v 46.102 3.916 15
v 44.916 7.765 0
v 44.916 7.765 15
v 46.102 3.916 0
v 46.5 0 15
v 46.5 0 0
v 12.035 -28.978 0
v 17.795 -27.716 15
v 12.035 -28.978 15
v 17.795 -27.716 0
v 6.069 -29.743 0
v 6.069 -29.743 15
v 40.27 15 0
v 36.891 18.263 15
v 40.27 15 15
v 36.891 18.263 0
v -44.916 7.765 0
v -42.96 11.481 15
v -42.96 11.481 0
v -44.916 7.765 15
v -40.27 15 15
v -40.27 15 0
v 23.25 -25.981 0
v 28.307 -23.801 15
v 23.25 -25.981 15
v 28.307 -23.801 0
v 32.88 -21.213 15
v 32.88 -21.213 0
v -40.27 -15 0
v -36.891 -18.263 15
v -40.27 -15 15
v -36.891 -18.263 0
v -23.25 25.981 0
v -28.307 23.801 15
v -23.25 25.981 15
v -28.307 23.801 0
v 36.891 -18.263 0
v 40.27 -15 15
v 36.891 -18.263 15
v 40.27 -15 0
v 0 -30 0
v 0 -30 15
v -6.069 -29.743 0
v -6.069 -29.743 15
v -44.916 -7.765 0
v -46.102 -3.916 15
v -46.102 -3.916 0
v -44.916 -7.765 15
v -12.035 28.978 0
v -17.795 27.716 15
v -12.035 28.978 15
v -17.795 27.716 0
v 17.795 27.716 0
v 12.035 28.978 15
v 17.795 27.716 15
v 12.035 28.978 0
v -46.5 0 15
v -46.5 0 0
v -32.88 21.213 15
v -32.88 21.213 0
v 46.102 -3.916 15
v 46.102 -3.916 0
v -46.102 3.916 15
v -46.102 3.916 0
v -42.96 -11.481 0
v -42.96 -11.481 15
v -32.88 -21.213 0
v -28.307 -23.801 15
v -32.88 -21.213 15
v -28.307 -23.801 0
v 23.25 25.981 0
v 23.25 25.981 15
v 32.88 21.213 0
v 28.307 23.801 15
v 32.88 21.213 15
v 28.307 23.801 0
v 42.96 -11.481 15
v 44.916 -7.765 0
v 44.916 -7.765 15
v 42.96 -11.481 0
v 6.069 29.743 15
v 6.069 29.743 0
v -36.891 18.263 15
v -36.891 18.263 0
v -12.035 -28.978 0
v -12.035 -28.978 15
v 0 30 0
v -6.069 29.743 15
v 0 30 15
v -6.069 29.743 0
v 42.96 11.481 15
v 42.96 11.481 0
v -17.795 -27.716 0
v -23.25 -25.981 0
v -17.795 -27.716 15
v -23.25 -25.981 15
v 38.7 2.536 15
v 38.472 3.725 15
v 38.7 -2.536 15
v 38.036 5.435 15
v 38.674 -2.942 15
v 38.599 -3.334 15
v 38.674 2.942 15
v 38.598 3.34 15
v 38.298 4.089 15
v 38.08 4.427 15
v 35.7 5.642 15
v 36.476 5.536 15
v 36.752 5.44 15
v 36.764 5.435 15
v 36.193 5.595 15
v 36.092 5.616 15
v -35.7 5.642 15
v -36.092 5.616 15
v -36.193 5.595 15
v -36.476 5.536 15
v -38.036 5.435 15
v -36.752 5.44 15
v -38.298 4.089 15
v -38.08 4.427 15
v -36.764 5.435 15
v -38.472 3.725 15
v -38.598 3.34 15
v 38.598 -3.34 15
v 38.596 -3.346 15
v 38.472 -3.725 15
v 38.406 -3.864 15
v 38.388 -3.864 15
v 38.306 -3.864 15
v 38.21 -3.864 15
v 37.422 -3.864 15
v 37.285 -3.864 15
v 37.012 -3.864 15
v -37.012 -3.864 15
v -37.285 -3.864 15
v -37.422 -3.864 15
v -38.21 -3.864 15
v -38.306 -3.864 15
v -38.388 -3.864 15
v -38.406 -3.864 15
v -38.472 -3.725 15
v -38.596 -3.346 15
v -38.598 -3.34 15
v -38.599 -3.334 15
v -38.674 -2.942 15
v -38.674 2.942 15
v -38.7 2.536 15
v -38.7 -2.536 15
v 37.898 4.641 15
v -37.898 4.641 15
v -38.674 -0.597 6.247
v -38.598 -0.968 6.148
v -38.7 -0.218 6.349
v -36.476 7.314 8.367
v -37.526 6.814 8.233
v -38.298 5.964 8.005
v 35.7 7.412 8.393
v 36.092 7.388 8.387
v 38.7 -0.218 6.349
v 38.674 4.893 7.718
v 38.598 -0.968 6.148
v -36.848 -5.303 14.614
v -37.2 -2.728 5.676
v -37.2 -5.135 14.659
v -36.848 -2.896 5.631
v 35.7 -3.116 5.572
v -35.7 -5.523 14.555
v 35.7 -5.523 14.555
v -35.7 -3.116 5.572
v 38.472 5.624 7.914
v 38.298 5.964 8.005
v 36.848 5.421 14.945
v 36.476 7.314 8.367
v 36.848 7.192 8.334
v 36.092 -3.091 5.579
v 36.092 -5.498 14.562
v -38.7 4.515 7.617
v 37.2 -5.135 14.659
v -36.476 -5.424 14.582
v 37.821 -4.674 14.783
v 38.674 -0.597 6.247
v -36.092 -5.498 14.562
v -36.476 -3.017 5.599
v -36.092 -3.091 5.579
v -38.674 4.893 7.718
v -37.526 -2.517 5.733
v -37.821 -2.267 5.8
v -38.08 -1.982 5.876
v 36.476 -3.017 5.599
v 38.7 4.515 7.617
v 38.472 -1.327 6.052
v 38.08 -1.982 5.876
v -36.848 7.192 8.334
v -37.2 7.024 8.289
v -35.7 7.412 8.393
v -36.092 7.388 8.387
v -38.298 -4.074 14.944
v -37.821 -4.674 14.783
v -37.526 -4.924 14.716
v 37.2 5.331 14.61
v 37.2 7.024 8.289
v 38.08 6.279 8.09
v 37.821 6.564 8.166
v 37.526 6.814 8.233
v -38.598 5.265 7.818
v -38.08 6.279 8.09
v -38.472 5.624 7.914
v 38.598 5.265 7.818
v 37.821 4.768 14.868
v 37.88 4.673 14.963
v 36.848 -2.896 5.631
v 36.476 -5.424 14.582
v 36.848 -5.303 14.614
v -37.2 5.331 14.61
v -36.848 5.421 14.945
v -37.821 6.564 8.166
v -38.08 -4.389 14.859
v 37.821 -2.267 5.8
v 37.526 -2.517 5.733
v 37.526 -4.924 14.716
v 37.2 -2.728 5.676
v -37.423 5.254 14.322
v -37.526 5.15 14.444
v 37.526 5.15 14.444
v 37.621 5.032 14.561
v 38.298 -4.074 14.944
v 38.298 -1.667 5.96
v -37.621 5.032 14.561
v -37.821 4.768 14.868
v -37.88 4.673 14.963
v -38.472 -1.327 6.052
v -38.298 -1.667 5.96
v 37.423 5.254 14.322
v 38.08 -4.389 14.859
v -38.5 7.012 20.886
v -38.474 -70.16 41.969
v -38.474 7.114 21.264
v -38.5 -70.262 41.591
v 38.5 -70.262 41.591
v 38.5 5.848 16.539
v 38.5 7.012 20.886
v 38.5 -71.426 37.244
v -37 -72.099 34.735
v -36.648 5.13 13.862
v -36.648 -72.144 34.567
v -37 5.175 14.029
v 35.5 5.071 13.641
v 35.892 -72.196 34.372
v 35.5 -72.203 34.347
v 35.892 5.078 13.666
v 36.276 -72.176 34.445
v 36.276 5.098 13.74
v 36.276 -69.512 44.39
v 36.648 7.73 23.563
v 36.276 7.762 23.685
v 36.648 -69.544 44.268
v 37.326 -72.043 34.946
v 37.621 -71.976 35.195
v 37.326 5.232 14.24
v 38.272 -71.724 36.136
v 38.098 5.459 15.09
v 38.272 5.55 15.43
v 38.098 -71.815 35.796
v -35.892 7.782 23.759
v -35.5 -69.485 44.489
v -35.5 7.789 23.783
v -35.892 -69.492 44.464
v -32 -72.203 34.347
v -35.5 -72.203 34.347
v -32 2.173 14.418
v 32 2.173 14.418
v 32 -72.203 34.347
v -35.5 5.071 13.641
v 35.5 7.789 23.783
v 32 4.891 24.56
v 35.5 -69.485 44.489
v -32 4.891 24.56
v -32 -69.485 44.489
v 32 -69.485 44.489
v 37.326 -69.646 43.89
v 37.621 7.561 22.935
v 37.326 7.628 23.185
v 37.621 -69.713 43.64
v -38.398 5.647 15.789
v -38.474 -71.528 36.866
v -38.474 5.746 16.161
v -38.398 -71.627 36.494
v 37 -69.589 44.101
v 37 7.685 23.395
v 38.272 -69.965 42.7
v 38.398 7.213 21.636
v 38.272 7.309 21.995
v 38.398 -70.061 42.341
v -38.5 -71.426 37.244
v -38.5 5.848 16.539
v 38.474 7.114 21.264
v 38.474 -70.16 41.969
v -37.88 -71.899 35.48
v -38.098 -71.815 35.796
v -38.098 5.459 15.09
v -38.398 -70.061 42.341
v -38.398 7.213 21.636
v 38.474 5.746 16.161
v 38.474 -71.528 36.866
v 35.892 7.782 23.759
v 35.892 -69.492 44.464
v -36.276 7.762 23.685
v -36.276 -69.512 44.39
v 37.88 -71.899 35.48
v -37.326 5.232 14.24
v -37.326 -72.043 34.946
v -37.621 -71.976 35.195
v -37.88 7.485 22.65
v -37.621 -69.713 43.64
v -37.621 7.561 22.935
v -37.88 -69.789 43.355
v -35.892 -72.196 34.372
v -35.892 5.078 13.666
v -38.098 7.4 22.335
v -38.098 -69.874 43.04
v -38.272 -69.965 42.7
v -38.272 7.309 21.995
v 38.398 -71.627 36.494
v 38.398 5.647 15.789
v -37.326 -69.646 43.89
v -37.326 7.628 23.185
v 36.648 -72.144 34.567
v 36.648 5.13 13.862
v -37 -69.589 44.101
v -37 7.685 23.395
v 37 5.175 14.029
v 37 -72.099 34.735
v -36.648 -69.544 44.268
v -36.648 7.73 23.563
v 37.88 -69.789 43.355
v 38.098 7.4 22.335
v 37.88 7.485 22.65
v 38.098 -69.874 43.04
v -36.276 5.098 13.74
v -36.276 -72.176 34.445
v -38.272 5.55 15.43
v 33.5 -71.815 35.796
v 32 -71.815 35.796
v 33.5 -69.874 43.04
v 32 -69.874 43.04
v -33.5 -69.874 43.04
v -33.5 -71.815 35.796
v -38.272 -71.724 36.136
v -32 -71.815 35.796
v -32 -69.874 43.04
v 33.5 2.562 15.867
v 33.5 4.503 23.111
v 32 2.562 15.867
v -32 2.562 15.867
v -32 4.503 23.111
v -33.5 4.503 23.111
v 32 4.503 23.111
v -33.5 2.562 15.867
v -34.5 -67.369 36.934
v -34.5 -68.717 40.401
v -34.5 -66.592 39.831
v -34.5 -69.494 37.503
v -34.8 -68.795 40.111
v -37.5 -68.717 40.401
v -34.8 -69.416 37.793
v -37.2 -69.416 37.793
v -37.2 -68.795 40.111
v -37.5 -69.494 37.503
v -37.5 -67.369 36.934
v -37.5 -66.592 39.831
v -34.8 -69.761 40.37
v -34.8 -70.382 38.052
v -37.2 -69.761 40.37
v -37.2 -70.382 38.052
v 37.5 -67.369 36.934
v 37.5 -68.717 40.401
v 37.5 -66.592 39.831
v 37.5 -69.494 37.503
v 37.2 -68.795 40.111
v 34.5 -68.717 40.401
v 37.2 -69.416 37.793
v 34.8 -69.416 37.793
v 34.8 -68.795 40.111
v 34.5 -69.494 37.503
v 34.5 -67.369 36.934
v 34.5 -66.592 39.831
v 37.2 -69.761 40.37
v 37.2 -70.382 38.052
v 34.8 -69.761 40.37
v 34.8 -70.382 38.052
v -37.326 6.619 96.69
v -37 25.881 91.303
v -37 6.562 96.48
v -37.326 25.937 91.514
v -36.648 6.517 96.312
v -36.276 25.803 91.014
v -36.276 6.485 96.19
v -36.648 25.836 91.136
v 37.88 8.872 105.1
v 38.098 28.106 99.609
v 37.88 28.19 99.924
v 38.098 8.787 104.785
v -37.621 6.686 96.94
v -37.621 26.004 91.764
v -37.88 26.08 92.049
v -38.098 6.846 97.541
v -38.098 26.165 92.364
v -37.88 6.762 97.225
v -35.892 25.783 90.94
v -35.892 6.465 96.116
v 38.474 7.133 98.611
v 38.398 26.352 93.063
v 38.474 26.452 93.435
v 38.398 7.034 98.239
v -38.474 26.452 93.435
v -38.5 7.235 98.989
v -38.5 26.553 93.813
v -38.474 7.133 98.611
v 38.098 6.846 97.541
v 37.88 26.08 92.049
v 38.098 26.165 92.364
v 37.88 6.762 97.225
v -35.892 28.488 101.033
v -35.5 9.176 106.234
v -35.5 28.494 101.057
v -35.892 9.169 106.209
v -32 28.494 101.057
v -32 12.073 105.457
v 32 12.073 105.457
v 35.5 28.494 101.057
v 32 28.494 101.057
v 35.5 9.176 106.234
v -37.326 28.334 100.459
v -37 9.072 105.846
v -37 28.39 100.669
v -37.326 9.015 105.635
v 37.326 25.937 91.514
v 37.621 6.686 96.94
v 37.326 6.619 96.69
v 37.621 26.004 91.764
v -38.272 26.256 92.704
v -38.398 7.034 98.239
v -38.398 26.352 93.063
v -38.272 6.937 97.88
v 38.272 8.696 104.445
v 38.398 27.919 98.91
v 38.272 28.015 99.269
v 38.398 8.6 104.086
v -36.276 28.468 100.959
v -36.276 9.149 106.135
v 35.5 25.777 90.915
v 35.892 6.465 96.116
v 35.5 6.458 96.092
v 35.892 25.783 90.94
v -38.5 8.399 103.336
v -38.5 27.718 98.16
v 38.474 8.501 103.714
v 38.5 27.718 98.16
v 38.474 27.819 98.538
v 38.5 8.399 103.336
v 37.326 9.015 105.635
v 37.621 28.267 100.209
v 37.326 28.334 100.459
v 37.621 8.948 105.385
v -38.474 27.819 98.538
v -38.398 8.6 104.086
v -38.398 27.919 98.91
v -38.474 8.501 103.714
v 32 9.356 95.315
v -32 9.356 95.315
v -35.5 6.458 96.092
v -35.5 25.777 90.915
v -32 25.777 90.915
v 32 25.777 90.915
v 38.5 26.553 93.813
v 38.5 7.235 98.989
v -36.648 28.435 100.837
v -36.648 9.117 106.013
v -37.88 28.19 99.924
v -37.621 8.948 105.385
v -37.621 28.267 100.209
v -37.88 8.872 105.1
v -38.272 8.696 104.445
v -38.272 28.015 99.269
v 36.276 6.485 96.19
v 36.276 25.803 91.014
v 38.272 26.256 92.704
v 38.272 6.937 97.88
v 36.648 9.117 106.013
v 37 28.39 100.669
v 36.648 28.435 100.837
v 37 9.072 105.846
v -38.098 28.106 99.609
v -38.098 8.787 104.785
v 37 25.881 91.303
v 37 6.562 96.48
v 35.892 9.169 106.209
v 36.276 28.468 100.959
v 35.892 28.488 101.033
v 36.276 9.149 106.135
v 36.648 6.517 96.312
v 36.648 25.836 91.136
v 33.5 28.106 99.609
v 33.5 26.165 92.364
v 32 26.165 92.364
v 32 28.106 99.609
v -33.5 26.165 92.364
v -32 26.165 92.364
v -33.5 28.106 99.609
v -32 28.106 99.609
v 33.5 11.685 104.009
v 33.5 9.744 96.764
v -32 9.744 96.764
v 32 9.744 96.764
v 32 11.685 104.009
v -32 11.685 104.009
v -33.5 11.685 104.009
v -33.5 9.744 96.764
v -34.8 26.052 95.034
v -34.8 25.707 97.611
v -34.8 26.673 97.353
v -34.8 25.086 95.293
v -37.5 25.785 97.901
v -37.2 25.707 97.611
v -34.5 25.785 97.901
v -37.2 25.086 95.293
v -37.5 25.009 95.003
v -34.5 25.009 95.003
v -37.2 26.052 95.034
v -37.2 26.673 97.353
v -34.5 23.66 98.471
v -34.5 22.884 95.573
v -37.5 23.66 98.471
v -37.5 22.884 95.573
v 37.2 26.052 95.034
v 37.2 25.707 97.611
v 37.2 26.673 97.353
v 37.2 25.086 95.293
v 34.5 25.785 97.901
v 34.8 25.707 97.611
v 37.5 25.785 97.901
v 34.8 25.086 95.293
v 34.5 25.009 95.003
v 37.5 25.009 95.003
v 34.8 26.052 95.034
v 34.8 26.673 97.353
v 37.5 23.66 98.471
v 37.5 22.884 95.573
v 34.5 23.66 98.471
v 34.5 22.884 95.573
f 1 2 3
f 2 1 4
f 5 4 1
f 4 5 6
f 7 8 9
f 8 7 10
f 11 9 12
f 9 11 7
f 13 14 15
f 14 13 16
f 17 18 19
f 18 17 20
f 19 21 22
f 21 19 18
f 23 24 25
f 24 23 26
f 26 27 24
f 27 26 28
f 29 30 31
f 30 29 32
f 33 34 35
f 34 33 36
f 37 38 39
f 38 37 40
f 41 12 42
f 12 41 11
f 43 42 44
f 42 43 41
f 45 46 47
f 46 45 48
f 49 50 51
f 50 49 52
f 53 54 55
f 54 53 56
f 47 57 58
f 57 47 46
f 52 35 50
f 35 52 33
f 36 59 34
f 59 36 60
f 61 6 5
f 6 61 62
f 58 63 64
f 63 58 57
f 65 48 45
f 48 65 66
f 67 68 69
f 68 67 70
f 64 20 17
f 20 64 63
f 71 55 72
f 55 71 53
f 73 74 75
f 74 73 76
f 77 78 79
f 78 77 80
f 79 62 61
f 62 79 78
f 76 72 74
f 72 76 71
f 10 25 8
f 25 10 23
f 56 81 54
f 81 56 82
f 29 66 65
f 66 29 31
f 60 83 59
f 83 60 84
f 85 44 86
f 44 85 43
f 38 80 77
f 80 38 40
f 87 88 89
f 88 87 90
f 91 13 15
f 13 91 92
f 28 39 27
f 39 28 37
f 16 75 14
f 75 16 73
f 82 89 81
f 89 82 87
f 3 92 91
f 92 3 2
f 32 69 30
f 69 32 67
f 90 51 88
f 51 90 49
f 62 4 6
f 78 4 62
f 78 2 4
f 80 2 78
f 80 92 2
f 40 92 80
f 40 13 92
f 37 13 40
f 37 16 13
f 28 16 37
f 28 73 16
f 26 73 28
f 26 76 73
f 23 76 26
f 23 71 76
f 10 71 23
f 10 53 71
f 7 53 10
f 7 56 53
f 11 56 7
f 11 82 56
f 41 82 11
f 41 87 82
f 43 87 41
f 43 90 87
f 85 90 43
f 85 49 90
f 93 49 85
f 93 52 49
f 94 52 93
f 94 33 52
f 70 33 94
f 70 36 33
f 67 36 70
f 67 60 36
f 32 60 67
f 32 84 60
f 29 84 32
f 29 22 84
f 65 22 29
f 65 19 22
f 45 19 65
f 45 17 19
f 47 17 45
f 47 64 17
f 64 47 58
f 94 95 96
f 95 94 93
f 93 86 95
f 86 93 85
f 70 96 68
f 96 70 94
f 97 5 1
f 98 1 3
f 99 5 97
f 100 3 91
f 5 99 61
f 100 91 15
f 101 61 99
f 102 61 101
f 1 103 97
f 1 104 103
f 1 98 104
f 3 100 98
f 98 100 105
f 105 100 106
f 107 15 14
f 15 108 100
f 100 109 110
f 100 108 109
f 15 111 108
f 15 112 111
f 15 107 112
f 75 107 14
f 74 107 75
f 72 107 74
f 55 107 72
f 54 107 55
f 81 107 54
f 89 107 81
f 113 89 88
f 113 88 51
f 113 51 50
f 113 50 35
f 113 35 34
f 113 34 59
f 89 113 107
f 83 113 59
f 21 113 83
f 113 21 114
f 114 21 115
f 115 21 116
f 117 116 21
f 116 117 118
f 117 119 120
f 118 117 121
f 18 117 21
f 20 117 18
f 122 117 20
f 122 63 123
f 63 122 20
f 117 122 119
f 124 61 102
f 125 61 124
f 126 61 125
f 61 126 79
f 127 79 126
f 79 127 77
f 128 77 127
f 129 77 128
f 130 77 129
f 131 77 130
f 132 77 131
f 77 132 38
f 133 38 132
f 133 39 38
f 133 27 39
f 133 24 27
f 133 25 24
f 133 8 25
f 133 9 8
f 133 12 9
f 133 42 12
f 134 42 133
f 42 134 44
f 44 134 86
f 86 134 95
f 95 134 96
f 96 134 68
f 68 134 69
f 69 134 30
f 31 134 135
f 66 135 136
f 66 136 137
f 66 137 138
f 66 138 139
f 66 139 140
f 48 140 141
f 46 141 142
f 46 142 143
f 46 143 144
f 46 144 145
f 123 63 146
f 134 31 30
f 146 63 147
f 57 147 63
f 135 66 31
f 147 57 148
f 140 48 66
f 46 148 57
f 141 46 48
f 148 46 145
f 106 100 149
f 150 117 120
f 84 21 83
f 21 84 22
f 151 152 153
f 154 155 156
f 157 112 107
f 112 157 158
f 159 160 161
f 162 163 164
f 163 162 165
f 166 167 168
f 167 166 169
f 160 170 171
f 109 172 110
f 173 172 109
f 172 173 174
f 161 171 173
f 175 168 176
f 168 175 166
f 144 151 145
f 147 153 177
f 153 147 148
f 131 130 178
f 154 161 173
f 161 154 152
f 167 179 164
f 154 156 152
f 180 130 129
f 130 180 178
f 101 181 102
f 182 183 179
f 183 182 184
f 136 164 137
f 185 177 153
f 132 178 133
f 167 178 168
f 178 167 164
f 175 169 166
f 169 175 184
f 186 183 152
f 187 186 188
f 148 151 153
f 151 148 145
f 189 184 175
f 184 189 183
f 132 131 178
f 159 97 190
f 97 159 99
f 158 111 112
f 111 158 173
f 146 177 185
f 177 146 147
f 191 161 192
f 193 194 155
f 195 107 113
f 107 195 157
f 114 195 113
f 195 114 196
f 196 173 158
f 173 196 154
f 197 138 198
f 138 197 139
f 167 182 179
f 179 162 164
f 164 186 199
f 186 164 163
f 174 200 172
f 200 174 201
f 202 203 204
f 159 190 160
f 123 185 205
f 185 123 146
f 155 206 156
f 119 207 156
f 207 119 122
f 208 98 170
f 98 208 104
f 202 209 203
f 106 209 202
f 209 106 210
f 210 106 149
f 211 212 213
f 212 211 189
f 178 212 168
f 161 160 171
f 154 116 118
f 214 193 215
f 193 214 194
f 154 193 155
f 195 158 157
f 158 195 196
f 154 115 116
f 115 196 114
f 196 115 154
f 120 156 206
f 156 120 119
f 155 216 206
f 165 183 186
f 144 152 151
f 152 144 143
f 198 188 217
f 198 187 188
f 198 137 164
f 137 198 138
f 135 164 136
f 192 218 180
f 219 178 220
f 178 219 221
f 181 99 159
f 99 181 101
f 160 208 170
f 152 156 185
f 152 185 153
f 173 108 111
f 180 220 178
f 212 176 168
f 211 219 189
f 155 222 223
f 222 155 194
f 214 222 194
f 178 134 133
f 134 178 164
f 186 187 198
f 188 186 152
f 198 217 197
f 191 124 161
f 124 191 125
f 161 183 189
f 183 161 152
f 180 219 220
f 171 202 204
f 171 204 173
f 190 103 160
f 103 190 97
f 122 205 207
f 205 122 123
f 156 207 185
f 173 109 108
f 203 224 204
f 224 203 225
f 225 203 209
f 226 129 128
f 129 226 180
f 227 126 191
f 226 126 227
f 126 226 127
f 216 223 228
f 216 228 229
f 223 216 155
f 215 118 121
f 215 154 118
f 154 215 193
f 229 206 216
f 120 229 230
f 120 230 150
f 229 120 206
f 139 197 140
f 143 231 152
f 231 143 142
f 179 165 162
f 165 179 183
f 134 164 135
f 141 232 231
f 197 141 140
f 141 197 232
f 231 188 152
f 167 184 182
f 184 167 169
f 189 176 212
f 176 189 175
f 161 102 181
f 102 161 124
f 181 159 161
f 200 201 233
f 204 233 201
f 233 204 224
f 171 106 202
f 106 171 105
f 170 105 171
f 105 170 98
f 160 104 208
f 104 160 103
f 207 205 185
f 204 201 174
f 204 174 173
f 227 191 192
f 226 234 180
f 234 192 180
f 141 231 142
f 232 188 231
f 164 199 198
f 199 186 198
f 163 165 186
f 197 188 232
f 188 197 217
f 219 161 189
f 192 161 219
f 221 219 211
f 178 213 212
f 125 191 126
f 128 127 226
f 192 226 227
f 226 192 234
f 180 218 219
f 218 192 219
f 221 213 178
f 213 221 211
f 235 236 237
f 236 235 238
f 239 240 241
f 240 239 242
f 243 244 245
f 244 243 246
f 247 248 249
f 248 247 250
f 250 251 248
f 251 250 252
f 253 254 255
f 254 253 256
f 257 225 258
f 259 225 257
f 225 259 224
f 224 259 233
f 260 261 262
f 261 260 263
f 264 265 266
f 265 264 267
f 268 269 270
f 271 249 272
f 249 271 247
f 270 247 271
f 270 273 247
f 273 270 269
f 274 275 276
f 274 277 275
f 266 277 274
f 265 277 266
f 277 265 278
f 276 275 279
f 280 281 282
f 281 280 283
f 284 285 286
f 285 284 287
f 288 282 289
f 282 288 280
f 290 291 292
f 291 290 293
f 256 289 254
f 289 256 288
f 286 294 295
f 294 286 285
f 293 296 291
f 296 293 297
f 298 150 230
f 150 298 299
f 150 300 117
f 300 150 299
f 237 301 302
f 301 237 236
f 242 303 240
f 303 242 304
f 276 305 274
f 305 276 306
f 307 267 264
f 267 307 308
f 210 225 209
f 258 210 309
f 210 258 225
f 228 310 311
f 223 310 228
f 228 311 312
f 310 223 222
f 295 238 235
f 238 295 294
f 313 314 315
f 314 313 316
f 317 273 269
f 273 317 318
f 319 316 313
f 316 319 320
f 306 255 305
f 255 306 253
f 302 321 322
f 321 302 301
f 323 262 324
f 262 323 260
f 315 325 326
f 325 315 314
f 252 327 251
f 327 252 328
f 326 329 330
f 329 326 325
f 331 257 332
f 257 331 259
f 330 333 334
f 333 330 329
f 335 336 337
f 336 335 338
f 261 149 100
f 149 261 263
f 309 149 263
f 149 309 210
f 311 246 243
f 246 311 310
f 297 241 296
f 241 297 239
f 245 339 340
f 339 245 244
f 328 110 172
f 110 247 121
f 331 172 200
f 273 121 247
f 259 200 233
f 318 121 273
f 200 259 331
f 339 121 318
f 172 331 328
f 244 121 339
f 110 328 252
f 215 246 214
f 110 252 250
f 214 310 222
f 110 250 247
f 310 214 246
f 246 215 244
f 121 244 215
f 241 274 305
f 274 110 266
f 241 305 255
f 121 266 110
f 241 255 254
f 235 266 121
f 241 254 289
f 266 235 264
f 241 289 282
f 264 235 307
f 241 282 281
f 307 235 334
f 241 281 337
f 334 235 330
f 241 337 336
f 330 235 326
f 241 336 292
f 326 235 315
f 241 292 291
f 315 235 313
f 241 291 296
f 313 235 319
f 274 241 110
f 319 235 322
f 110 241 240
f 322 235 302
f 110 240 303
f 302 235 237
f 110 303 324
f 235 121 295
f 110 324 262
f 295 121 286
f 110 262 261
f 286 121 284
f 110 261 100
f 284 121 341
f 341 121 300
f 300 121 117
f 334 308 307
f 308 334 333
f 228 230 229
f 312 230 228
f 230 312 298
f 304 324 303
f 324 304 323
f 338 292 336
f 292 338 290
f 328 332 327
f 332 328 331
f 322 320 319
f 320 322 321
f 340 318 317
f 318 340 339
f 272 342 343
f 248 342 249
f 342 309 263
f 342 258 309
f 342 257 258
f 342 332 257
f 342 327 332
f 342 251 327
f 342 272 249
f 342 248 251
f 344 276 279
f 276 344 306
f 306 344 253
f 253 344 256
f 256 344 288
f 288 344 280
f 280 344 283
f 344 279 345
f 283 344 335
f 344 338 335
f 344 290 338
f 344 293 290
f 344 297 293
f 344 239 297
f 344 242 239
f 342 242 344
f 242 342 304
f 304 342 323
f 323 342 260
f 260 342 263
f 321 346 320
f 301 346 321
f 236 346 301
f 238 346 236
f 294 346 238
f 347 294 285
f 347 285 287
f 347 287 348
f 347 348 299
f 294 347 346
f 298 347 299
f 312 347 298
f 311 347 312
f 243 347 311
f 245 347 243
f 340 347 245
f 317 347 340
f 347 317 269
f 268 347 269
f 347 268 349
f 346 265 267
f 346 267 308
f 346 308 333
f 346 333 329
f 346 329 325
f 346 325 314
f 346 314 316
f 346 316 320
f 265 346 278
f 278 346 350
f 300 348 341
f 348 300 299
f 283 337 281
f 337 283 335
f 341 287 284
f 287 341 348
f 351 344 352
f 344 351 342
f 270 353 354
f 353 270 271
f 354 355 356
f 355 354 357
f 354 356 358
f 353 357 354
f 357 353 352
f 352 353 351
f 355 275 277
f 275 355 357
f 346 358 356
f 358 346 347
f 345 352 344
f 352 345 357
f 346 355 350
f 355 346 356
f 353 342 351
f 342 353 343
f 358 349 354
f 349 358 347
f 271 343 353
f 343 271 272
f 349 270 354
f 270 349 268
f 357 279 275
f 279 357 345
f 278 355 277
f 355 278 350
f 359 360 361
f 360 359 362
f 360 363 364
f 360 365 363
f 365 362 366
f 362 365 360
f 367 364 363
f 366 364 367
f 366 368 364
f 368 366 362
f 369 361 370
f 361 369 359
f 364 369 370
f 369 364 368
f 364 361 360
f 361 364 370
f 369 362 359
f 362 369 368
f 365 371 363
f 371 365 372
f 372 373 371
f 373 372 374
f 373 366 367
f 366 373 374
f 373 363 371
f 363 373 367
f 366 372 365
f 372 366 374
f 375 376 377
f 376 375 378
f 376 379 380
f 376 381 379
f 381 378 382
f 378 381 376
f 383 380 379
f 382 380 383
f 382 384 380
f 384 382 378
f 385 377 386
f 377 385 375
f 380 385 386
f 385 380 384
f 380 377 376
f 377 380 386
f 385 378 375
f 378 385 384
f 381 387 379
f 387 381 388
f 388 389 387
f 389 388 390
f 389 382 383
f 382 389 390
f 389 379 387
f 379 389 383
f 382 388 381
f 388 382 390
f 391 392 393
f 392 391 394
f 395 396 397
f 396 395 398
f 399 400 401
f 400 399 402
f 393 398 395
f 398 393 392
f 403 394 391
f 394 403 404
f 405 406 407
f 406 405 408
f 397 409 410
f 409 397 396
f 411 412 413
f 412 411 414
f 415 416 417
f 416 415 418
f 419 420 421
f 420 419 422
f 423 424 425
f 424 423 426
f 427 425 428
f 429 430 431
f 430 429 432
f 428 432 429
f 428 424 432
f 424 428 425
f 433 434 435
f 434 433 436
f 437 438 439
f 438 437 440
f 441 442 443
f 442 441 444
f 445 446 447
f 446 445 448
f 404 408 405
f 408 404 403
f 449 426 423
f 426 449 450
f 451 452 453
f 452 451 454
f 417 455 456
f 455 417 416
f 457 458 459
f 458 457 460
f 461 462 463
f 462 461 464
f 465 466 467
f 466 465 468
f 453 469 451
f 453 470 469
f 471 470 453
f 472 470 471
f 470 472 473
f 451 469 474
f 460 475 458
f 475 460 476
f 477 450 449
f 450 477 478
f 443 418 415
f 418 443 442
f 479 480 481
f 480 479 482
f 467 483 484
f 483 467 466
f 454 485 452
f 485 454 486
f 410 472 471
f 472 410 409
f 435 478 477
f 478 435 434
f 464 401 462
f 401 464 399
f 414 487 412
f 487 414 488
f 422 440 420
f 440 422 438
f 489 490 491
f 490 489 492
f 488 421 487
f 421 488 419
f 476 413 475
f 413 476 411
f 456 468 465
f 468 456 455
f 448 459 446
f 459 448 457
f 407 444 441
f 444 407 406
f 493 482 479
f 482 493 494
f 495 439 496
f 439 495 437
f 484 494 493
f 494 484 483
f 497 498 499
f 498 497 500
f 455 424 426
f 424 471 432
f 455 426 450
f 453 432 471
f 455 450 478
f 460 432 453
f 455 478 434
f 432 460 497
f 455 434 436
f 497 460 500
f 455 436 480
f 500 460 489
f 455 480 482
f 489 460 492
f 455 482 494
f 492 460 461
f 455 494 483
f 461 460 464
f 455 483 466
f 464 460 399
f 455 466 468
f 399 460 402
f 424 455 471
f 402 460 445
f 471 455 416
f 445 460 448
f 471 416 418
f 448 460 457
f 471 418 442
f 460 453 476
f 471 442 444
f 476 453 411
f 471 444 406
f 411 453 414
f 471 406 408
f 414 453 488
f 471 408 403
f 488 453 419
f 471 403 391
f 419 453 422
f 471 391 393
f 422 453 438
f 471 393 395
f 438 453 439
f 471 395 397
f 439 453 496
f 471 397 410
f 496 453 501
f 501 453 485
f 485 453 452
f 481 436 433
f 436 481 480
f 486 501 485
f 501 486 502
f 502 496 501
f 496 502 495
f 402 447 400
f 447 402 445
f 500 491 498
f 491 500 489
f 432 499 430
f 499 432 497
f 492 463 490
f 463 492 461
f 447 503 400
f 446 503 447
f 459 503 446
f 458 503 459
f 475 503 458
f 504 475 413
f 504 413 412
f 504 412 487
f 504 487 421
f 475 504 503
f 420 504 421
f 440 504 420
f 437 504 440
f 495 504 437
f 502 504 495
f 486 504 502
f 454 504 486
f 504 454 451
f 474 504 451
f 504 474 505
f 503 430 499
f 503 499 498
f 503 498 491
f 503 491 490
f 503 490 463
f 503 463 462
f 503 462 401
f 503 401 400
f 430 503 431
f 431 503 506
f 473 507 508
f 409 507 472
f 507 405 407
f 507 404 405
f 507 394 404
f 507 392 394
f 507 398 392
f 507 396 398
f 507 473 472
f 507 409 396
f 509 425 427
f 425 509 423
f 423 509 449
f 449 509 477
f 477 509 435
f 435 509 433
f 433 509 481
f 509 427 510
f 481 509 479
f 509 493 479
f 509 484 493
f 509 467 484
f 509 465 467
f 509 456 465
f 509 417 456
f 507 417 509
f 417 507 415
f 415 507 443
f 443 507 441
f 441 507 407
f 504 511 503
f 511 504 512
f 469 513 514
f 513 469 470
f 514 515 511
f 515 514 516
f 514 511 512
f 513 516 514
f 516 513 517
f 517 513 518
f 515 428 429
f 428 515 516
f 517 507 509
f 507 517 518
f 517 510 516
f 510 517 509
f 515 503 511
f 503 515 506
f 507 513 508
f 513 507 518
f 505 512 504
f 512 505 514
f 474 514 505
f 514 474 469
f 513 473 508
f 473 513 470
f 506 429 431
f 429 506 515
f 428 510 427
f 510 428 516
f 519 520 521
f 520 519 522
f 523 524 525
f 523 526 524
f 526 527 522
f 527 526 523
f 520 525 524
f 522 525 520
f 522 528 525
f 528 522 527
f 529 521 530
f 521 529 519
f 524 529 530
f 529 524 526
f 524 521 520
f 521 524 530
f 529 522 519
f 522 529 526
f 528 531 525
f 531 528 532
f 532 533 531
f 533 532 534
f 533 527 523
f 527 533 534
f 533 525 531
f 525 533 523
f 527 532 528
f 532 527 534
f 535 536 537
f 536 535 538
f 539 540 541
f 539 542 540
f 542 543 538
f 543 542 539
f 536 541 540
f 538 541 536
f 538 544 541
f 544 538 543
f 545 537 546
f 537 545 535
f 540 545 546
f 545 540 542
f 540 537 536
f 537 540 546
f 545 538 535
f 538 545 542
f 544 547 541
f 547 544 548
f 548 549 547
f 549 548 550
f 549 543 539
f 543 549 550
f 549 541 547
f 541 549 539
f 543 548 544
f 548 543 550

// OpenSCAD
// PrimeBind PSA Grade Card Bumper V1
// Perimeter frame for PSA graded cards — front and back fully open
// Body + cap snap together with magnets; card faces 100% exposed
//
// --- PSA STANDARD SLAB: 66×93×9.5mm + 1mm clearance per dimension
//
// --- EXPORT -------------------------------------------------------------------
//   1. pb_psa_body.stl   → RENDER = "body"   [black]
//   2. pb_psa_cap.stl    → RENDER = "cap"    [black or color]
//   3. pb_psa_stand.stl  → RENDER = "stand"  [black]
//   RENDER = "both" shows body + cap assembled for preview

$fn = 48;

// ─── PSA SLAB DIMS ─────────────────────────────────────────────
psa_w = 66.0;
psa_h = 93.0;
psa_d = 9.5;

// ─── INTERIOR (slab + 1mm clearance each dimension) ───────────
inner_w = psa_w + 1;    // 67.0mm
inner_d = psa_d + 1;    // 10.5mm
inner_h = psa_h + 1;    // 94.0mm — split between body + cap below

// ─── FRAME WALLS ───────────────────────────────────────────────
side_wall = 5.0;    // left + right walls only — no face walls
floor_t   = 3.0;    // body floor + cap ceiling
r_edge    = 3.0;

// ─── OUTER DIMS ────────────────────────────────────────────────
outer_w = inner_w + 2 * side_wall;   // 77mm
outer_d = inner_d;                    // 10.5mm — both faces open

// ─── HEIGHT SPLIT ──────────────────────────────────────────────
body_h = 80.0;   // body: 77mm interior (80-3)
cap_h  = 20.0;   // cap:  17mm interior (20-3) → total 94mm ✓

// ─── WINDOW LIP ────────────────────────────────────────────────
lip_w = 1.5;   // overhang on each side of window — card can't slide out face
lip_t = 1.5;   // lip depth front-to-back

// ─── MAGNETS (3mm disc, press-fit square pockets) ──────────────
mag_r    = 1.5;   // 3.0mm pocket = 3mm magnet press fit
mag_dep  = 3.2;
mag_seal = 0.8;
snap_r   = 1.2;   // 2.4mm snap lip — retains magnet during pause-at-layer
snap_h   = 1.0;

mag_lx = side_wall / 2;             // left mag X center  = 2.5mm
mag_rx = outer_w - side_wall / 2;   // right mag X center = 74.5mm
mag_cy = outer_d / 2;               // depth center       = 5.25mm

// ─── STAND ─────────────────────────────────────────────────────
lean   = 15;
base_w = outer_w + 16;   // 93mm oval width
base_d = 60.0;
base_h = 15.0;
g_dep  = 8.3;             // groove depth along lean axis (8mm vertical — no window to clear)

RENDER = "all";

// =============================================================================
// HELPER
// =============================================================================

module rbox(w, d, h, r) {
    hull() {
        for (xi = [r, w - r]) for (yi = [r, d - r])
            translate([xi, yi, 0]) cylinder(r=r, h=h);
    }
}

// =============================================================================
// BODY
// Frame: left wall + right wall + bottom floor. Front + back fully open.
// Slab drops in from top. Magnets at top face of each side wall.
// =============================================================================

module bumper_body() {
    difference() {
        rbox(outer_w, outer_d, body_h, r_edge);

        // interior channel — full inner width, between the two face lips
        translate([side_wall, lip_t, floor_t])
            cube([inner_w, outer_d - 2*lip_t, body_h]);
        // front face window — lip_w narrower each side, card can only enter from top
        translate([side_wall + lip_w, -0.01, floor_t])
            cube([inner_w - 2*lip_w, lip_t + 0.01, body_h]);
        // back face window
        translate([side_wall + lip_w, outer_d - lip_t, floor_t])
            cube([inner_w - 2*lip_w, lip_t + 0.01, body_h]);

        // left magnet pocket (snap lip at top — entry point)
        translate([mag_lx - mag_r, mag_cy - mag_r, body_h - mag_dep - mag_seal])
            cube([mag_r*2, mag_r*2, mag_dep - snap_h]);
        translate([mag_lx - snap_r, mag_cy - snap_r, body_h - mag_seal - snap_h])
            cube([snap_r*2, snap_r*2, snap_h]);

        // right magnet pocket
        translate([mag_rx - mag_r, mag_cy - mag_r, body_h - mag_dep - mag_seal])
            cube([mag_r*2, mag_r*2, mag_dep - snap_h]);
        translate([mag_rx - snap_r, mag_cy - snap_r, body_h - mag_seal - snap_h])
            cube([snap_r*2, snap_r*2, snap_h]);
    }
}

// =============================================================================
// CAP
// Left wall + right wall + top floor. Snaps down over body top.
// Magnets at bottom face — snap lip at bottom (entry when printed ceiling-down).
// =============================================================================

module bumper_cap() {
    difference() {
        rbox(outer_w, outer_d, cap_h, r_edge);

        // interior channel
        translate([side_wall, lip_t, 0])
            cube([inner_w, outer_d - 2*lip_t, cap_h - floor_t]);
        // front face window
        translate([side_wall + lip_w, -0.01, 0])
            cube([inner_w - 2*lip_w, lip_t + 0.01, cap_h - floor_t]);
        // back face window
        translate([side_wall + lip_w, outer_d - lip_t, 0])
            cube([inner_w - 2*lip_w, lip_t + 0.01, cap_h - floor_t]);

        // left magnet pocket (snap lip at bottom in SCAD — entry when ceiling-down)
        translate([mag_lx - snap_r, mag_cy - snap_r, mag_seal])
            cube([snap_r*2, snap_r*2, snap_h]);
        translate([mag_lx - mag_r, mag_cy - mag_r, mag_seal + snap_h])
            cube([mag_r*2, mag_r*2, mag_dep - snap_h]);

        // right magnet pocket
        translate([mag_rx - snap_r, mag_cy - snap_r, mag_seal])
            cube([snap_r*2, snap_r*2, snap_h]);
        translate([mag_rx - mag_r, mag_cy - mag_r, mag_seal + snap_h])
            cube([mag_r*2, mag_r*2, mag_dep - snap_h]);
    }
}

// =============================================================================
// STAND
// Same lean groove concept as toploader stand — resized for PSA bumper.
// Bumper has no window so groove can be deeper (8mm) for better grip.
// =============================================================================

module psa_stand() {
    cut_l = outer_w + 0.4;
    cut_w = outer_d + 0.4;

    difference() {
        scale([base_w / base_d, 1, 1])
            cylinder(r = base_d / 2, h = base_h);

        translate([0, 0, base_h])
            rotate([lean, 0, 0])
                translate([-cut_l/2, -cut_w/2, -g_dep])
                    rbox(cut_l, cut_w, g_dep + 1, r_edge);
    }
}

// =============================================================================
// RENDER
// =============================================================================

if      (RENDER == "body")  { color("white") bumper_body(); }
else if (RENDER == "cap")   { color("white") bumper_cap();  }
else if (RENDER == "stand") { color("white") psa_stand();   }
else if (RENDER == "both")  {
    color("white") bumper_body();
    translate([0, 0, body_h + 2]) color("white") bumper_cap();

} else if (RENDER == "all") {
    // Stand
    color("white") psa_stand();

    // Bumper assembled and standing in stand groove (15° lean)
    translate([0, 0, base_h])
    rotate([-lean, 0, 0]) {
        // body — rotated from print-flat to upright
        translate([-outer_w/2, -outer_d/2, 0])
        translate([0, outer_d, 0])
        rotate([90, 0, 0])
            color("white") bumper_body();

        // cap on top of body
        translate([-outer_w/2, -outer_d/2, body_h])
        translate([0, outer_d, 0])
        rotate([90, 0, 0])
            color("gray") bumper_cap();
    }
}
